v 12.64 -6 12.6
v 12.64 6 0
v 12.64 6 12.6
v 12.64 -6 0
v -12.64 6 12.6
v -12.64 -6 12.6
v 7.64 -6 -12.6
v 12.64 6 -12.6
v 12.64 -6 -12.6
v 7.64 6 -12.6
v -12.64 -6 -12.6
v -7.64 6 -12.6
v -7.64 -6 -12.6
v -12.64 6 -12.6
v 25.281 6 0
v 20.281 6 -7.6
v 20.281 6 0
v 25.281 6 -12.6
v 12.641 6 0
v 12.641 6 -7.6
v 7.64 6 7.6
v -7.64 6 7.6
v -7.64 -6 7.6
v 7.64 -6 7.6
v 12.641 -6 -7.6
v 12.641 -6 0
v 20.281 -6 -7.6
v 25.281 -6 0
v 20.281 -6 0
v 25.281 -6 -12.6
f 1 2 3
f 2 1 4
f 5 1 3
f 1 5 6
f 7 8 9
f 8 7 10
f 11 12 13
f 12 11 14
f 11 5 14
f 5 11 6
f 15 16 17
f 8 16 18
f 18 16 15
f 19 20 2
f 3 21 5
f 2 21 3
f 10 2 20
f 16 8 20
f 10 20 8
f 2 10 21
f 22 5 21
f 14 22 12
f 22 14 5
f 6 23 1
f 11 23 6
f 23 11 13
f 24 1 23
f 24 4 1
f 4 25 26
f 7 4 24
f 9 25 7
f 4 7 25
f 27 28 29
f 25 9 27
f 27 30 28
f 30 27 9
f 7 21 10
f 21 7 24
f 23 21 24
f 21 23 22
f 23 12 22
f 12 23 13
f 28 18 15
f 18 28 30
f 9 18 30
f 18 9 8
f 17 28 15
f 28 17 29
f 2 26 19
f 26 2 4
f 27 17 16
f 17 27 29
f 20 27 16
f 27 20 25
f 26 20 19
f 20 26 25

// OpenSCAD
BEAM_WIDTH = 25.20;
BEAM_HEIGHT = 15.28;

HOOK_LENGTH = 2;
HOOK_THICKNESS = 10;

module open_box(x, y, z, a) {
    difference() {
        cube([x+a, y+a, z], center=true);
        translate([0, 0, - a/2]) {
            cube([x, y + a + 1, z], center=true);
        }
    }
}

union() {
    open_box(BEAM_HEIGHT, HOOK_LENGTH, BEAM_WIDTH, HOOK_THICKNESS);

    mirror([0, 0, 1]) 
    translate([BEAM_WIDTH-8.739, 0, BEAM_WIDTH/4])
    open_box(BEAM_HEIGHT/2, HOOK_LENGTH, BEAM_WIDTH/2, HOOK_THICKNESS);
}
